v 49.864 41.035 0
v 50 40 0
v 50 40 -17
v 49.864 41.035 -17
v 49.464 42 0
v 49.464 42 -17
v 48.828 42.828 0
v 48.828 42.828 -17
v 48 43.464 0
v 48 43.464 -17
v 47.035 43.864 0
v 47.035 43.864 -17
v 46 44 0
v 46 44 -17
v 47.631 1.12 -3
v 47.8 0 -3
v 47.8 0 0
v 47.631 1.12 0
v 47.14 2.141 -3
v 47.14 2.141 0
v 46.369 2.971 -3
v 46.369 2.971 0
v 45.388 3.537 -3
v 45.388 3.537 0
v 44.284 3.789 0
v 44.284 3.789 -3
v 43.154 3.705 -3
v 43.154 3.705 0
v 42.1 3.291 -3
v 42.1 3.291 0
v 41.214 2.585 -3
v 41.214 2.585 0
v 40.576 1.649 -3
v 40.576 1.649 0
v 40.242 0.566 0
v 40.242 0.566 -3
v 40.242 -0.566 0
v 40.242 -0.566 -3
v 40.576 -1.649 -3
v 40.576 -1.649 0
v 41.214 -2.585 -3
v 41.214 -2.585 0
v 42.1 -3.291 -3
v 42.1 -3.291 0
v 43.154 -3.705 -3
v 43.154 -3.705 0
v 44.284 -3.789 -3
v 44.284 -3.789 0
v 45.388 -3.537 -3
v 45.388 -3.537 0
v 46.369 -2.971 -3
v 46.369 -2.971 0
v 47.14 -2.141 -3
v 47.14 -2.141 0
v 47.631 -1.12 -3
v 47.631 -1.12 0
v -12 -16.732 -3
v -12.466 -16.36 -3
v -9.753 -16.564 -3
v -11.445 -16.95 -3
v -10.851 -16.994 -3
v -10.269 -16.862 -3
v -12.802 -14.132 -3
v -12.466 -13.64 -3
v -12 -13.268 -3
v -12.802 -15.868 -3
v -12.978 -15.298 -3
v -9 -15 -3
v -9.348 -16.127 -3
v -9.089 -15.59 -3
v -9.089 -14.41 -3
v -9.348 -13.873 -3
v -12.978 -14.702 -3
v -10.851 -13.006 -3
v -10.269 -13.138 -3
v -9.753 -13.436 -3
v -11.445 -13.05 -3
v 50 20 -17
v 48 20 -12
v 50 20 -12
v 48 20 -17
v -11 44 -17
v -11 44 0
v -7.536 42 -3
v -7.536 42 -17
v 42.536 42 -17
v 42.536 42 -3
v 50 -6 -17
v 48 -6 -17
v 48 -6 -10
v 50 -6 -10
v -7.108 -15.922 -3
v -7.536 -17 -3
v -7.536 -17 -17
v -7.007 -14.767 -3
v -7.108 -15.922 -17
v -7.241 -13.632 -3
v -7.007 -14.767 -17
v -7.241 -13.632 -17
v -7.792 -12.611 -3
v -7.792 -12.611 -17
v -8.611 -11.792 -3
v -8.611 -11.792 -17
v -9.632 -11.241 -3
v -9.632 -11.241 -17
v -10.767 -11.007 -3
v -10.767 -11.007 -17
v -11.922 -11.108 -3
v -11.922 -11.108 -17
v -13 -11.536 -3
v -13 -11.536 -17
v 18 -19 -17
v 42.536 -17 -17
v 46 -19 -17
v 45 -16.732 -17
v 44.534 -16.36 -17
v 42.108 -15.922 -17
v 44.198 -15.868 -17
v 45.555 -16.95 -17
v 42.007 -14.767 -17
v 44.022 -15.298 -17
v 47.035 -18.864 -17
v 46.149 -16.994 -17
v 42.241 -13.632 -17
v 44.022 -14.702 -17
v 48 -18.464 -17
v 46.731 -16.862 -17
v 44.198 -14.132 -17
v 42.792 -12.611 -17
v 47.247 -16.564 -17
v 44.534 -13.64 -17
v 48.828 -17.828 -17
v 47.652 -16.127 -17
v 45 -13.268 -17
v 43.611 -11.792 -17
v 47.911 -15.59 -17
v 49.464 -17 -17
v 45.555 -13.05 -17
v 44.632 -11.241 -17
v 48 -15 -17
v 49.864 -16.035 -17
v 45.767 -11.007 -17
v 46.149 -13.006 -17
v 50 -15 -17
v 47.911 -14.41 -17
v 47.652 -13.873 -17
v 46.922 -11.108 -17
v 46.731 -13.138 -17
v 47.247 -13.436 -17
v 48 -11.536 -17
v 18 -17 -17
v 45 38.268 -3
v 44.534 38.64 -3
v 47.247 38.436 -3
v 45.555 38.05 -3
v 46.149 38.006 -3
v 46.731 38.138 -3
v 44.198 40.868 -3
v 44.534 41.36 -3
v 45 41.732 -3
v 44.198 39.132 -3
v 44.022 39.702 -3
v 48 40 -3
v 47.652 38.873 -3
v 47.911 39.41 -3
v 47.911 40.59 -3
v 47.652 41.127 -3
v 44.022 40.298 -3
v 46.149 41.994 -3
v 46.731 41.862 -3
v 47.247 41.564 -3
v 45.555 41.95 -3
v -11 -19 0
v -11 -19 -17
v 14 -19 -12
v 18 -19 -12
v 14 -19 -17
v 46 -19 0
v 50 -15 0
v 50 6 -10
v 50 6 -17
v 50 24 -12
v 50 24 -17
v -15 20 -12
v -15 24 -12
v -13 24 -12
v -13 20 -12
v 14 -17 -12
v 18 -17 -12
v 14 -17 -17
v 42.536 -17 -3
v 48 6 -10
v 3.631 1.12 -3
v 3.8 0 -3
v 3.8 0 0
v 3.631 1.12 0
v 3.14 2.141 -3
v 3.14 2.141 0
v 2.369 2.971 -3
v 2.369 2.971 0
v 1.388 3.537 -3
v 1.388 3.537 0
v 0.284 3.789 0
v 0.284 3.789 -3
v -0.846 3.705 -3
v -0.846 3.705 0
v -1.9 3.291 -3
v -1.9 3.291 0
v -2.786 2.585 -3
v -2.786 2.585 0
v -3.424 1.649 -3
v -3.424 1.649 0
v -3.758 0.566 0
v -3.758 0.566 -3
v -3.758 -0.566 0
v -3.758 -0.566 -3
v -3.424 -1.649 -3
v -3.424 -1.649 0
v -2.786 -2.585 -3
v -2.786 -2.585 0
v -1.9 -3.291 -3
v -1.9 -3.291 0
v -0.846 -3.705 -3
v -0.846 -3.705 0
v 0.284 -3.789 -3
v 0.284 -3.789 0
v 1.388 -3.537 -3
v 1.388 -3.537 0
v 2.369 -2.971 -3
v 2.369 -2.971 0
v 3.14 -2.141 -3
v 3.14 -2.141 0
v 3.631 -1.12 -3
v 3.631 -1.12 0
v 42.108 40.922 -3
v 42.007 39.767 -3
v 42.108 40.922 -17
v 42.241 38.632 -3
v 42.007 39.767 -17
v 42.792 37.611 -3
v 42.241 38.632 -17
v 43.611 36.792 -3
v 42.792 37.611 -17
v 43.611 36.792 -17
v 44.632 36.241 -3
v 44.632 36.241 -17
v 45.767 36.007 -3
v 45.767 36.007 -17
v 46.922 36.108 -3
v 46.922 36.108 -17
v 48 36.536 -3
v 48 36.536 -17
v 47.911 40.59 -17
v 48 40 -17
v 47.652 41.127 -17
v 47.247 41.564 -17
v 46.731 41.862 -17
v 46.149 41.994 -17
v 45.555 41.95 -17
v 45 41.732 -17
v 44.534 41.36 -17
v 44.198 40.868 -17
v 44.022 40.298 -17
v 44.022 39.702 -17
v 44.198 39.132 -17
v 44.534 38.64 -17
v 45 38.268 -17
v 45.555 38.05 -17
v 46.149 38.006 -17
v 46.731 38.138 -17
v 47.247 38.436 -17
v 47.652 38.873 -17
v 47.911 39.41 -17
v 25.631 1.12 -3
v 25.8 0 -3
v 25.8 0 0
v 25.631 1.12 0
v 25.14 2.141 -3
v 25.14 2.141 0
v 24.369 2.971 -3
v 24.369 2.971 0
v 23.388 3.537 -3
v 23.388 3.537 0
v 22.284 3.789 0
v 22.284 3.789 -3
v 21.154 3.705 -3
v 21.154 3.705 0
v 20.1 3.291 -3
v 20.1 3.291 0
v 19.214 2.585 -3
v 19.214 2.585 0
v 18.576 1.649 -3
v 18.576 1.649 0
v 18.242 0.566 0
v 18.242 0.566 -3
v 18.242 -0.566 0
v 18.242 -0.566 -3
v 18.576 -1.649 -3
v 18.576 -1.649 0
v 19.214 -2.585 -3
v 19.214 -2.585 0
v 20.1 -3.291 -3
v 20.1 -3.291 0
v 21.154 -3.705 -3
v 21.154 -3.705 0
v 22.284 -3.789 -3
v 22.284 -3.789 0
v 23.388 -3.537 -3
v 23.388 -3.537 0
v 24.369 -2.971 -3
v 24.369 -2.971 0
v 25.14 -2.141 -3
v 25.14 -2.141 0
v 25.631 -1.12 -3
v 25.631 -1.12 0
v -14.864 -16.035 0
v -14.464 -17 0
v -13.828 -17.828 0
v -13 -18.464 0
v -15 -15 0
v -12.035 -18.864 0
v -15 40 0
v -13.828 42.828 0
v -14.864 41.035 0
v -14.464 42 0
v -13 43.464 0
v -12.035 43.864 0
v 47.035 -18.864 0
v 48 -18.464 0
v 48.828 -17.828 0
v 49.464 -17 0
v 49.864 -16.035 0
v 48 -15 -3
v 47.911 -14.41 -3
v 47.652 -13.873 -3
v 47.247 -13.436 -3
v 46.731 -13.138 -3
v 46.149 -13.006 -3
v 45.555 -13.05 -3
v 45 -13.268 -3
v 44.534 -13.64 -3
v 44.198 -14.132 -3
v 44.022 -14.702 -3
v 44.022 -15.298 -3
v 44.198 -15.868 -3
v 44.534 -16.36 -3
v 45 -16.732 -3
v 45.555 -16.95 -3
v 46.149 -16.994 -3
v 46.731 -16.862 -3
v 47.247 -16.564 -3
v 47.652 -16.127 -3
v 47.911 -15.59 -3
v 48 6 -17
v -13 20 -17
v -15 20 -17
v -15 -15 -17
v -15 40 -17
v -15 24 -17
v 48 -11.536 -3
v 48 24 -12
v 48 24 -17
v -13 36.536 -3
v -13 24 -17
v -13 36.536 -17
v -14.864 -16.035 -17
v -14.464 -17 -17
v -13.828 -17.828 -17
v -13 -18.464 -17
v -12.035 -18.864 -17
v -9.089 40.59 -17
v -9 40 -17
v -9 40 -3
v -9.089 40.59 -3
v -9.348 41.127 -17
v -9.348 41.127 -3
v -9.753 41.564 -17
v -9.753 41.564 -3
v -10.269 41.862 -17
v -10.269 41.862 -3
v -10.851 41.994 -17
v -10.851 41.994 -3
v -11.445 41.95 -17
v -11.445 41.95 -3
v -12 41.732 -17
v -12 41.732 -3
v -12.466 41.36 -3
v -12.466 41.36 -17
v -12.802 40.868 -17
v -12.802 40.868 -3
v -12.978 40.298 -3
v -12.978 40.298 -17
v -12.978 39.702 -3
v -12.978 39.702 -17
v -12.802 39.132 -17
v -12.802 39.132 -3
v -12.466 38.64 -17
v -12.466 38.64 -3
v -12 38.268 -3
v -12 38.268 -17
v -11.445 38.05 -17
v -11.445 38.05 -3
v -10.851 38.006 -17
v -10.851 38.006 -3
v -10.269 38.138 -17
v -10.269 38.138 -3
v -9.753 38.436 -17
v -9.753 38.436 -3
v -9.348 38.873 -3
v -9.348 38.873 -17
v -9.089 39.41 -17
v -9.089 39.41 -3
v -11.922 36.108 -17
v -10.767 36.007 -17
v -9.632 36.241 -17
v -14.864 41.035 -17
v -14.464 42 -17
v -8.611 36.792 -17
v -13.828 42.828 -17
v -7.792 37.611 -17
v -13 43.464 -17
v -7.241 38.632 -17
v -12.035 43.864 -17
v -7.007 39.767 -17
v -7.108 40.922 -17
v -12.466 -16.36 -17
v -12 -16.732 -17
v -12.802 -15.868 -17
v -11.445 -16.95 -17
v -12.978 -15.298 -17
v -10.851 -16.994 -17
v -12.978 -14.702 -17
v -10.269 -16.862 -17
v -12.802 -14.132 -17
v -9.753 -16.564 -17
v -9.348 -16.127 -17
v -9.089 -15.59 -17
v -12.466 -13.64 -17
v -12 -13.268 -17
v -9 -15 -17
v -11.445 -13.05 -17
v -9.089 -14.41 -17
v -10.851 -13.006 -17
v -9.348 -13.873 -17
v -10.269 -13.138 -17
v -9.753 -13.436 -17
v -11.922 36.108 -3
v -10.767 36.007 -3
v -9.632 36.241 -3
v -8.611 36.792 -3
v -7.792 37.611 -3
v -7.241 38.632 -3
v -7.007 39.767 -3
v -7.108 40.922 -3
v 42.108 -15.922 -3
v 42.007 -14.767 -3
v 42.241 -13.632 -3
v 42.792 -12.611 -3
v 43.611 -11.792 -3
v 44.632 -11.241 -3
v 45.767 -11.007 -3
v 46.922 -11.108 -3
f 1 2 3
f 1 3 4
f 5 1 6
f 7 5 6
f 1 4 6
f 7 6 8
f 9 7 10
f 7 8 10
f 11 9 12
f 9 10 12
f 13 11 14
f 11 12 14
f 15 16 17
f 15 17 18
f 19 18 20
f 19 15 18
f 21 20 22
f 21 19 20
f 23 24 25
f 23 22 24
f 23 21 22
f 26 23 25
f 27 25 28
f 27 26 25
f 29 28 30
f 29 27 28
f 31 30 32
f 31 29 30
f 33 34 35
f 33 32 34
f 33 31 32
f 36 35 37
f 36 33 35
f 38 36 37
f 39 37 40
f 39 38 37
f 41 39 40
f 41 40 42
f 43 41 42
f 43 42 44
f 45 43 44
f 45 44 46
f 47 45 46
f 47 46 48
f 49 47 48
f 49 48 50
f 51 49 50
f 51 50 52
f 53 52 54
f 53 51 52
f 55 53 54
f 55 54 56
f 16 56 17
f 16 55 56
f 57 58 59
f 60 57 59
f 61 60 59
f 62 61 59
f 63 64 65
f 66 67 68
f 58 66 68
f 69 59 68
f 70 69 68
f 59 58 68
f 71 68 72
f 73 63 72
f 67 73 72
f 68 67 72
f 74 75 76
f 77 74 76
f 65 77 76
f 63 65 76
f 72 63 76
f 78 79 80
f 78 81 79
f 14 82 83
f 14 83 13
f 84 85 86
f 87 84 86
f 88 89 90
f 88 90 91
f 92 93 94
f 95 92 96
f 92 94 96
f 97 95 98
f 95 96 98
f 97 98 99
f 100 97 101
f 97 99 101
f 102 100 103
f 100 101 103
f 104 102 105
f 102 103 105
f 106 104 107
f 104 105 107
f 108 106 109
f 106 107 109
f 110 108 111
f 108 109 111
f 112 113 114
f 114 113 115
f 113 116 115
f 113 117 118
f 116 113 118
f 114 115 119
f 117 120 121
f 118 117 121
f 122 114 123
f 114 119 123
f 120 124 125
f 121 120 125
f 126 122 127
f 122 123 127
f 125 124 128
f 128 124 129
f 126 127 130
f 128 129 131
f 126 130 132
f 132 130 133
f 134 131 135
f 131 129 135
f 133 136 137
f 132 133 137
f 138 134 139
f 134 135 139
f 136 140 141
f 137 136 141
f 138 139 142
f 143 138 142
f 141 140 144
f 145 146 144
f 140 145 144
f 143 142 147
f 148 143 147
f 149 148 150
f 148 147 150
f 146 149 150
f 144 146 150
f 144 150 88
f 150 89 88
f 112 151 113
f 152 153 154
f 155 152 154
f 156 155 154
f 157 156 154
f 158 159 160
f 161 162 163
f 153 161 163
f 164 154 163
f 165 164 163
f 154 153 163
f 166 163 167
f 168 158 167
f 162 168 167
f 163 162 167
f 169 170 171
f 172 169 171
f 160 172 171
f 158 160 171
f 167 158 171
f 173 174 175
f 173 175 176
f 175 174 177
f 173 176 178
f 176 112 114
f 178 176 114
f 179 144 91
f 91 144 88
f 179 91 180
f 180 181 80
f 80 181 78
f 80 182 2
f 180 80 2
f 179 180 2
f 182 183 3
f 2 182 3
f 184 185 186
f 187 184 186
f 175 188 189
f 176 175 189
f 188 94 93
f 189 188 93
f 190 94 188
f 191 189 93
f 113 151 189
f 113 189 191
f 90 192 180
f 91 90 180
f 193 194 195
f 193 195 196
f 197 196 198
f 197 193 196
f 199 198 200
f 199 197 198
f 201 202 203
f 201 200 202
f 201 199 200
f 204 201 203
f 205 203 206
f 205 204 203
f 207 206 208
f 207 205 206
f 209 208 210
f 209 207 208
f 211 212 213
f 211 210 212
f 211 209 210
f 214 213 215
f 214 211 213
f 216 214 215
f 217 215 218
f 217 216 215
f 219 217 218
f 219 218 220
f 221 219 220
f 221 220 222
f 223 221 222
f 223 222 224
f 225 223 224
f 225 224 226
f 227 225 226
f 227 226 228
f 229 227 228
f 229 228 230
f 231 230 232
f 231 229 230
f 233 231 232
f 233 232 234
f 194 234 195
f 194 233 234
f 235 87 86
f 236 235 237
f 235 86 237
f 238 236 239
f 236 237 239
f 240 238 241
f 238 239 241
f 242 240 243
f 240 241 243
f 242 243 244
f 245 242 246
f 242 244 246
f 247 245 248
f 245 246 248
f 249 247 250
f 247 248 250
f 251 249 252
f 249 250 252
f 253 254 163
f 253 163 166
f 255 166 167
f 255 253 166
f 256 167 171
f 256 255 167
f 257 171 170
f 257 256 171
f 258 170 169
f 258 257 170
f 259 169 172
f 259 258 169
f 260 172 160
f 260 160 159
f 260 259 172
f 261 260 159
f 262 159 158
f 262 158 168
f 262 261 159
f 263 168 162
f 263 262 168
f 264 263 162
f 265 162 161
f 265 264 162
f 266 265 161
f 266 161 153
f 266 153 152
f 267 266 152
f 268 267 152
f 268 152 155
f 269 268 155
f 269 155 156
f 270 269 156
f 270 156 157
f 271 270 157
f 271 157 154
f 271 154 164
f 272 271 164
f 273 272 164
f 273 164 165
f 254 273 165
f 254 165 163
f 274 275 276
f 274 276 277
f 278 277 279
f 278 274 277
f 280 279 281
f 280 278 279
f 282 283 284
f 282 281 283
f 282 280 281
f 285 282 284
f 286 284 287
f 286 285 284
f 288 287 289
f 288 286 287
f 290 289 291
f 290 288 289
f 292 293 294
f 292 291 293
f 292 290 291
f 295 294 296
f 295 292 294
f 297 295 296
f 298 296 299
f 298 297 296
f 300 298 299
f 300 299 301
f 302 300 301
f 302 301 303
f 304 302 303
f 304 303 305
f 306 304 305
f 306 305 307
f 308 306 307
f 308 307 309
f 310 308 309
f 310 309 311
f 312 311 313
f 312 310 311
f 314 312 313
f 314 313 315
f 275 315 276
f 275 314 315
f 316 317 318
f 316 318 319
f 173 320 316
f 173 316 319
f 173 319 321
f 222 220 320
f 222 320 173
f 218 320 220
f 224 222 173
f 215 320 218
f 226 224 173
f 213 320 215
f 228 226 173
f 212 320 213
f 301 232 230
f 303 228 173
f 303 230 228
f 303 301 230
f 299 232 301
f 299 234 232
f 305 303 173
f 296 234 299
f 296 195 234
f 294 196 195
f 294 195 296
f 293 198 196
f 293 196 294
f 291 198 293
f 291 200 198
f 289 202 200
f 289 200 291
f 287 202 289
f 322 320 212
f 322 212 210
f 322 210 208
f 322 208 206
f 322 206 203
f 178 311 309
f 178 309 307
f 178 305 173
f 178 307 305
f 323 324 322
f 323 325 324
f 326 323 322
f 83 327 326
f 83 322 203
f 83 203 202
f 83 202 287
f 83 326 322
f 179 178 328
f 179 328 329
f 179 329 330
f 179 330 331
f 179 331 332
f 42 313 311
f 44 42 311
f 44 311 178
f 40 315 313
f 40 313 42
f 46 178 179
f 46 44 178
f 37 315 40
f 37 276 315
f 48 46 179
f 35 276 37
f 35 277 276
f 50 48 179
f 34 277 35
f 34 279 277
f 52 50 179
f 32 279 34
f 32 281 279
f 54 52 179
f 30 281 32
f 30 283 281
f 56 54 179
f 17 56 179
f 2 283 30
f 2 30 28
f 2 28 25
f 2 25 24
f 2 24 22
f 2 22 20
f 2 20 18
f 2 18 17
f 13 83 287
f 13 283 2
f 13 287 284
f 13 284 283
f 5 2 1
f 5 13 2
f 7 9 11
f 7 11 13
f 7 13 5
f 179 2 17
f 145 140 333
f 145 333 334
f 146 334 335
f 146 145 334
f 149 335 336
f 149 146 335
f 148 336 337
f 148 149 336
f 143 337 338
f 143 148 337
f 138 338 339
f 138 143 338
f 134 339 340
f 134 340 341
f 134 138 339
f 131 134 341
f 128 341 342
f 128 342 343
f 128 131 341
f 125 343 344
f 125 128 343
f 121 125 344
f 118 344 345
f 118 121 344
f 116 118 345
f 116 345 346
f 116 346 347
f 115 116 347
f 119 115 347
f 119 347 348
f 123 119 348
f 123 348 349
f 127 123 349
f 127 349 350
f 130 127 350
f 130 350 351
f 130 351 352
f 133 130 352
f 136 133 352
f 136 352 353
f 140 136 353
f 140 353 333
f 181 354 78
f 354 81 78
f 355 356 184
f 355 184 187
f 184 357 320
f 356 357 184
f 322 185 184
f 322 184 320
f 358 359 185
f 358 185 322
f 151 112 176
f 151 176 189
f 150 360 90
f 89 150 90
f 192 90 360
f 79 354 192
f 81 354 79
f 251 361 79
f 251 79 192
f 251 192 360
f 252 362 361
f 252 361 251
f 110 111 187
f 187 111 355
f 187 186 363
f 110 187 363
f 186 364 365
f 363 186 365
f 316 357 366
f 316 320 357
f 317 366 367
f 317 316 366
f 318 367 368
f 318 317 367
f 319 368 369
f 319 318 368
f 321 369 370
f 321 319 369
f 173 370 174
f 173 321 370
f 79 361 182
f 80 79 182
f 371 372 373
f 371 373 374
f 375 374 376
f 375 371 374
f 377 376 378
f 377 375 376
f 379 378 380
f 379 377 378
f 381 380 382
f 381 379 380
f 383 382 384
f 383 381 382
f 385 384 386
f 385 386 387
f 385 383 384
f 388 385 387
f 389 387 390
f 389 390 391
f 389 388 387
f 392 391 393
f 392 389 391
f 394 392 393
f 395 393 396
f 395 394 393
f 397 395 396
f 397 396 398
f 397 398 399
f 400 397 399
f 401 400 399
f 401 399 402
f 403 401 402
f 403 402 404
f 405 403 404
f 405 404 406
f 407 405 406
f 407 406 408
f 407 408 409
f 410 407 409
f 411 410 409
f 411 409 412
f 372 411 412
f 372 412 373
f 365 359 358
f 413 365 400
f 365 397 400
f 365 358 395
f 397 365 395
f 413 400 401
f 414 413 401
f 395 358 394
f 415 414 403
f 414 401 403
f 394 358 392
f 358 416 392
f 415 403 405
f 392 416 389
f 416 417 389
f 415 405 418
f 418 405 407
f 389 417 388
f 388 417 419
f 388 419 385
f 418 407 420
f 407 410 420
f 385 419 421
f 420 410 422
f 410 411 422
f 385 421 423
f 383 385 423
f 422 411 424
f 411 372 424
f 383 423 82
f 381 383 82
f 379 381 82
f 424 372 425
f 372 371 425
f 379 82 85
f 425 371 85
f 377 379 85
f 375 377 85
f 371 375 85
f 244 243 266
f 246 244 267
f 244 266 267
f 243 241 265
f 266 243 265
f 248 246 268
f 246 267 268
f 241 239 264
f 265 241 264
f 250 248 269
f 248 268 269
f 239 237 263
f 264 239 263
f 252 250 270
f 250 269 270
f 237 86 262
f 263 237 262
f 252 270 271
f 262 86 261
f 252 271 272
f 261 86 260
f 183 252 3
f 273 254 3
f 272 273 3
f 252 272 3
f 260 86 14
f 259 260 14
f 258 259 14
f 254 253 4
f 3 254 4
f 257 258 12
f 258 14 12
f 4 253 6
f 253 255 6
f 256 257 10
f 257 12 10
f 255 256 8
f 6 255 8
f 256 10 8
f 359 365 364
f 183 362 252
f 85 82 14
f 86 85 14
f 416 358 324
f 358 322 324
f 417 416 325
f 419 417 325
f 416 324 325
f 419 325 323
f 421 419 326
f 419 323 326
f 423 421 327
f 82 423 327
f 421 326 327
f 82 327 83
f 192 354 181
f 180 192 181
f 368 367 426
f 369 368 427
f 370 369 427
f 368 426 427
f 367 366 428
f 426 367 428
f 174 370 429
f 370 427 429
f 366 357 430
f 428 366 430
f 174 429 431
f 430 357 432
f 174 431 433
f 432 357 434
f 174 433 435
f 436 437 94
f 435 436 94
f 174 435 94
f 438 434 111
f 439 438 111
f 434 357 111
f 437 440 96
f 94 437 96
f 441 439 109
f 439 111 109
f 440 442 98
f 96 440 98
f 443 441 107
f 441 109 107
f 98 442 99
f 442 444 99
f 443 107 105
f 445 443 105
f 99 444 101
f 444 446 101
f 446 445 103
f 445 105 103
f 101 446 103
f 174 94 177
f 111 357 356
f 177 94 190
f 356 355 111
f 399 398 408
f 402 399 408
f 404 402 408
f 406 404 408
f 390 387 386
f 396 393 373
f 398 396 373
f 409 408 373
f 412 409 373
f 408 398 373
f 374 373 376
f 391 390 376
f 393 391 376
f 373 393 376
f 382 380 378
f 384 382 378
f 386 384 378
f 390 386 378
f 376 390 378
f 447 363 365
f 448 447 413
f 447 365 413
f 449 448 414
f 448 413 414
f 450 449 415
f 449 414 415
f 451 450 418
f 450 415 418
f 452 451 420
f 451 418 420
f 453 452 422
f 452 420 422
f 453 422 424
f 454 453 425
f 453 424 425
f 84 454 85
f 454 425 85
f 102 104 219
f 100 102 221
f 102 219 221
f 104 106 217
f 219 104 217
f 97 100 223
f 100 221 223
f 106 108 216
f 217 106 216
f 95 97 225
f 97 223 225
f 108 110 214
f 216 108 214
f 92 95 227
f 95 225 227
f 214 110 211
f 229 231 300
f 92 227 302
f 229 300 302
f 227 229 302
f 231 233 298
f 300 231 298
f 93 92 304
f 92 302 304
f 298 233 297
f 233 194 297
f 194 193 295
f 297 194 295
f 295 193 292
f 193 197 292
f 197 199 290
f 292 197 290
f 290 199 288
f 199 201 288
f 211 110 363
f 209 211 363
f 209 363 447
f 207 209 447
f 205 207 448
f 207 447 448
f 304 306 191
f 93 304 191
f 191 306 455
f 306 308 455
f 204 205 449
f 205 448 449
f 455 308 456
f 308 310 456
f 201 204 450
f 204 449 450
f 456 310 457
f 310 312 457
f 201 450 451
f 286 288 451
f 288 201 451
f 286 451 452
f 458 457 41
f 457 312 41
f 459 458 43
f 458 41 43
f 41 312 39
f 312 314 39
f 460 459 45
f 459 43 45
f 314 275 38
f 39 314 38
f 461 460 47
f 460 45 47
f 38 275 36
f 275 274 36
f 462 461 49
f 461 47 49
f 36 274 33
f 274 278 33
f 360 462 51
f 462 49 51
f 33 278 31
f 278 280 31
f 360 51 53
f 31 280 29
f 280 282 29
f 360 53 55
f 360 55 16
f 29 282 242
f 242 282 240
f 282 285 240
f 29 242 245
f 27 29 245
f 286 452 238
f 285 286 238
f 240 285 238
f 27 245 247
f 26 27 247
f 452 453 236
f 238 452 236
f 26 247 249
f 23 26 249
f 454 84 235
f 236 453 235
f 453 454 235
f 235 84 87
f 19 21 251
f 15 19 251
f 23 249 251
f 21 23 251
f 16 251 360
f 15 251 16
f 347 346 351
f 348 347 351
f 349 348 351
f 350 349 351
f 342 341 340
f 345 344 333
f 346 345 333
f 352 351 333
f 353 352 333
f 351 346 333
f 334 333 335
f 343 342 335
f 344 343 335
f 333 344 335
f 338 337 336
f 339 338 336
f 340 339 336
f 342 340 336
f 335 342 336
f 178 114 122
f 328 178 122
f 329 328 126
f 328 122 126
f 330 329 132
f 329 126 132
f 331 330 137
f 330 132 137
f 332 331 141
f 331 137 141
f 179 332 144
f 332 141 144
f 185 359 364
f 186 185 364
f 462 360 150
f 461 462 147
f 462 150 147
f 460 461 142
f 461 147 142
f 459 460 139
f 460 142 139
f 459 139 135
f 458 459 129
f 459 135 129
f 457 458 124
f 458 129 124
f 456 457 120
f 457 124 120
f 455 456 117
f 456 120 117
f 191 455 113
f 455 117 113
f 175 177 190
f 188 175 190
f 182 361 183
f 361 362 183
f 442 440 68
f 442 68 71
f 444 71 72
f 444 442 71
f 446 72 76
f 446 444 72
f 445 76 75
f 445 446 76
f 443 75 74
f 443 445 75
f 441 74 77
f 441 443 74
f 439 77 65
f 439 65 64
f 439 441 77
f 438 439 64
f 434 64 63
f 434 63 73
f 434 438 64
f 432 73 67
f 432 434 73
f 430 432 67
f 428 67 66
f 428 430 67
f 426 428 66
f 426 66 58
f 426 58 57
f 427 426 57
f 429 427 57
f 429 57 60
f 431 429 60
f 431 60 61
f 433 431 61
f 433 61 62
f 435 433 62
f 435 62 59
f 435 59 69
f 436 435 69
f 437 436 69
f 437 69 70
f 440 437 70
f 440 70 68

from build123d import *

# Parameters (mm, degrees)
CYLINDER_R        = 3.8
CYLINDER_DEPTH    = 50
CYLINDER001_R     = 10
CYLINDER001_DEPTH = 15
BOX001_W          = 12
BOX001_H          = 12
BOX001_DEPTH      = 10
BOX003_W          = 80
BOX003_H          = 4
BOX003_DEPTH      = 10
BOX004_W          = 4
BOX004_H          = 40
BOX004_DEPTH      = 10
CYLINDER003_R     = 2
CYLINDER003_DEPTH = 17
ARRAY001_X_COUNT  = 2
ARRAY001_X_PITCH  = 57
ARRAY001_Y_COUNT  = 2
ARRAY001_Y_PITCH  = 55
BOX002_W          = 61
BOX002_H          = 59
BOX002_DEPTH      = 17
BOX_W             = 65
BOX_H             = 63
BOX_DEPTH         = 17
FILLET_R          = 4
CYLINDER002_R     = 4
CYLINDER002_DEPTH = 17
ARRAY_X_COUNT     = 2
ARRAY_X_PITCH     = 57
ARRAY_Y_COUNT     = 2
ARRAY_Y_PITCH     = 55


with BuildPart() as encoder_hole:
    # Cylinder → Cylinder (new body)
    with BuildSketch(Plane.XY):
        Circle(CYLINDER_R)
    extrude(amount=CYLINDER_DEPTH)


with BuildPart() as encoder_cap:
    # Cylinder001 → Cylinder001 (new body)
    with BuildSketch(Plane.XY.offset(35)):
        Circle(CYLINDER001_R)
    extrude(amount=CYLINDER001_DEPTH)


with BuildPart() as encoder_fusion:
    # Box001 → Box001 (new body)
    with BuildSketch(Plane(origin=(-6, -6, 0), x_dir=(1, 0, 0), z_dir=(0, 0, 1))):
        with Locations((6, 6)):
            Rectangle(BOX001_W, BOX001_H)
    extrude(amount=BOX001_DEPTH)

    # Fusion: union encoder hole, encoder cap
    add(encoder_hole.part)
    add(encoder_cap.part)


with BuildPart() as encoder_fusion_1:
    # Fusion placement: moved
    add(encoder_fusion.part.moved(Location((0, 0, -20))))


with BuildPart() as encoder_clone001:
    # Body001 base: copy of encoder fusion
    add(encoder_fusion_1.part)


with BuildPart() as encoder_clone001_1:
    # Clone001 placement: moved
    add(encoder_clone001.part.moved(Location((0, 0, 20))))


with BuildPart() as encoder_clone001_2:
    # Body001 placement: moved
    add(encoder_clone001_1.part.moved(Location((22, 0, -20))))


with BuildPart() as encoder_compound_clone:
    # Body base: copy of encoder fusion
    add(encoder_fusion_1.part)


with BuildPart() as encoder_compound_clone_1:
    # Clone placement: moved
    add(encoder_compound_clone.part.moved(Location((0, 0, 20))))


with BuildPart() as encoder_compound_clone_2:
    # Body placement: moved
    add(encoder_compound_clone_1.part.moved(Location((44, 0, -20))))

    # Compound: union encoder clone001, encoder fusion
    add(encoder_clone001_2.part)
    add(encoder_fusion_1.part)


with BuildPart() as cube003:
    # Box003 → Box003 (new body)
    with BuildSketch(Plane(origin=(-20, 20, -22), x_dir=(1, 0, 0), z_dir=(0, 0, 1))):
        with Locations((40, 2)):
            Rectangle(BOX003_W, BOX003_H)
    extrude(amount=BOX003_DEPTH)


with BuildPart() as cube004:
    # Box004 → Box004 (new body)
    with BuildSketch(Plane(origin=(14, -40, -22), x_dir=(1, 0, 0), z_dir=(0, 0, 1))):
        with Locations((2, 20)):
            Rectangle(BOX004_W, BOX004_H)
    extrude(amount=BOX004_DEPTH)


with BuildPart() as encoder_box_extract:
    # Cylinder003 → Cylinder003 (new body)
    with BuildSketch(Plane(origin=(-11, -15, -20), x_dir=(1, 0, 0), z_dir=(0, 0, 1))):
        Circle(CYLINDER003_R)
    extrude(amount=CYLINDER003_DEPTH)

    # Array001 X: encoder box extract ×2


with BuildPart() as encoder_box_extract_1:
    add(encoder_box_extract.part)
    with Locations(*[(i * ARRAY001_X_PITCH, 0, 0) for i in range(1, ARRAY001_X_COUNT)]):
        add(encoder_box_extract.part)

    # Array001 Y: encoder box extract ×2


with BuildPart() as encoder_box_extract_2:
    add(encoder_box_extract_1.part)
    with Locations(*[(0, i * ARRAY001_Y_PITCH, 0) for i in range(1, ARRAY001_Y_COUNT)]):
        add(encoder_box_extract_1.part)

    # Fusion002: union encoder compound clone, Cube003, Cube004
    add(encoder_compound_clone_2.part)
    add(cube003.part)
    add(cube004.part)


with BuildPart() as cube002:
    # Box002 → Box002 (new body)
    with BuildSketch(Plane(origin=(-13, -17, -20), x_dir=(1, 0, 0), z_dir=(0, 0, 1))):
        with Locations((30.5, 29.5)):
            Rectangle(BOX002_W, BOX002_H)
    extrude(amount=BOX002_DEPTH)


with BuildPart() as fillet_body:
    # Box → Box (new body)
    with BuildSketch(Plane(origin=(-15, -19, -17), x_dir=(1, 0, 0), z_dir=(0, 0, 1))):
        with Locations((32.5, 31.5)):
            Rectangle(BOX_W, BOX_H)
    extrude(amount=BOX_DEPTH)

    # Cut001: cut Cube002
    add(cube002.part, mode=Mode.SUBTRACT)

    # Fillet
    fillet_edges = [fillet_body.edges().sort_by_distance(p)[0] for p in [
        (-15, -19, -8.5),
        (-15, 44, -8.5),
        (50, -19, -8.5),
        (50, 44, -8.5),
    ]]
    fillet(fillet_edges, radius=FILLET_R)


with BuildPart() as encoder_box_cut:
    # Cylinder002 → Cylinder002 (new body)
    with BuildSketch(Plane(origin=(-11, -15, -17), x_dir=(1, 0, 0), z_dir=(0, 0, 1))):
        Circle(CYLINDER002_R)
    extrude(amount=CYLINDER002_DEPTH)

    # Array X: encoder box cut ×2


with BuildPart() as encoder_box_cut_1:
    add(encoder_box_cut.part)
    with Locations(*[(i * ARRAY_X_PITCH, 0, 0) for i in range(1, ARRAY_X_COUNT)]):
        add(encoder_box_cut.part)

    # Array Y: encoder box cut ×2


with BuildPart() as encoder_box_cut_2:
    add(encoder_box_cut_1.part)
    with Locations(*[(0, i * ARRAY_Y_PITCH, 0) for i in range(1, ARRAY_Y_COUNT)]):
        add(encoder_box_cut_1.part)

    # Fusion001: union Fillet body
    add(fillet_body.part)

    # Cut: cut encoder box extract
    add(encoder_box_extract_2.part, mode=Mode.SUBTRACT)


solid = encoder_box_cut_2.part
